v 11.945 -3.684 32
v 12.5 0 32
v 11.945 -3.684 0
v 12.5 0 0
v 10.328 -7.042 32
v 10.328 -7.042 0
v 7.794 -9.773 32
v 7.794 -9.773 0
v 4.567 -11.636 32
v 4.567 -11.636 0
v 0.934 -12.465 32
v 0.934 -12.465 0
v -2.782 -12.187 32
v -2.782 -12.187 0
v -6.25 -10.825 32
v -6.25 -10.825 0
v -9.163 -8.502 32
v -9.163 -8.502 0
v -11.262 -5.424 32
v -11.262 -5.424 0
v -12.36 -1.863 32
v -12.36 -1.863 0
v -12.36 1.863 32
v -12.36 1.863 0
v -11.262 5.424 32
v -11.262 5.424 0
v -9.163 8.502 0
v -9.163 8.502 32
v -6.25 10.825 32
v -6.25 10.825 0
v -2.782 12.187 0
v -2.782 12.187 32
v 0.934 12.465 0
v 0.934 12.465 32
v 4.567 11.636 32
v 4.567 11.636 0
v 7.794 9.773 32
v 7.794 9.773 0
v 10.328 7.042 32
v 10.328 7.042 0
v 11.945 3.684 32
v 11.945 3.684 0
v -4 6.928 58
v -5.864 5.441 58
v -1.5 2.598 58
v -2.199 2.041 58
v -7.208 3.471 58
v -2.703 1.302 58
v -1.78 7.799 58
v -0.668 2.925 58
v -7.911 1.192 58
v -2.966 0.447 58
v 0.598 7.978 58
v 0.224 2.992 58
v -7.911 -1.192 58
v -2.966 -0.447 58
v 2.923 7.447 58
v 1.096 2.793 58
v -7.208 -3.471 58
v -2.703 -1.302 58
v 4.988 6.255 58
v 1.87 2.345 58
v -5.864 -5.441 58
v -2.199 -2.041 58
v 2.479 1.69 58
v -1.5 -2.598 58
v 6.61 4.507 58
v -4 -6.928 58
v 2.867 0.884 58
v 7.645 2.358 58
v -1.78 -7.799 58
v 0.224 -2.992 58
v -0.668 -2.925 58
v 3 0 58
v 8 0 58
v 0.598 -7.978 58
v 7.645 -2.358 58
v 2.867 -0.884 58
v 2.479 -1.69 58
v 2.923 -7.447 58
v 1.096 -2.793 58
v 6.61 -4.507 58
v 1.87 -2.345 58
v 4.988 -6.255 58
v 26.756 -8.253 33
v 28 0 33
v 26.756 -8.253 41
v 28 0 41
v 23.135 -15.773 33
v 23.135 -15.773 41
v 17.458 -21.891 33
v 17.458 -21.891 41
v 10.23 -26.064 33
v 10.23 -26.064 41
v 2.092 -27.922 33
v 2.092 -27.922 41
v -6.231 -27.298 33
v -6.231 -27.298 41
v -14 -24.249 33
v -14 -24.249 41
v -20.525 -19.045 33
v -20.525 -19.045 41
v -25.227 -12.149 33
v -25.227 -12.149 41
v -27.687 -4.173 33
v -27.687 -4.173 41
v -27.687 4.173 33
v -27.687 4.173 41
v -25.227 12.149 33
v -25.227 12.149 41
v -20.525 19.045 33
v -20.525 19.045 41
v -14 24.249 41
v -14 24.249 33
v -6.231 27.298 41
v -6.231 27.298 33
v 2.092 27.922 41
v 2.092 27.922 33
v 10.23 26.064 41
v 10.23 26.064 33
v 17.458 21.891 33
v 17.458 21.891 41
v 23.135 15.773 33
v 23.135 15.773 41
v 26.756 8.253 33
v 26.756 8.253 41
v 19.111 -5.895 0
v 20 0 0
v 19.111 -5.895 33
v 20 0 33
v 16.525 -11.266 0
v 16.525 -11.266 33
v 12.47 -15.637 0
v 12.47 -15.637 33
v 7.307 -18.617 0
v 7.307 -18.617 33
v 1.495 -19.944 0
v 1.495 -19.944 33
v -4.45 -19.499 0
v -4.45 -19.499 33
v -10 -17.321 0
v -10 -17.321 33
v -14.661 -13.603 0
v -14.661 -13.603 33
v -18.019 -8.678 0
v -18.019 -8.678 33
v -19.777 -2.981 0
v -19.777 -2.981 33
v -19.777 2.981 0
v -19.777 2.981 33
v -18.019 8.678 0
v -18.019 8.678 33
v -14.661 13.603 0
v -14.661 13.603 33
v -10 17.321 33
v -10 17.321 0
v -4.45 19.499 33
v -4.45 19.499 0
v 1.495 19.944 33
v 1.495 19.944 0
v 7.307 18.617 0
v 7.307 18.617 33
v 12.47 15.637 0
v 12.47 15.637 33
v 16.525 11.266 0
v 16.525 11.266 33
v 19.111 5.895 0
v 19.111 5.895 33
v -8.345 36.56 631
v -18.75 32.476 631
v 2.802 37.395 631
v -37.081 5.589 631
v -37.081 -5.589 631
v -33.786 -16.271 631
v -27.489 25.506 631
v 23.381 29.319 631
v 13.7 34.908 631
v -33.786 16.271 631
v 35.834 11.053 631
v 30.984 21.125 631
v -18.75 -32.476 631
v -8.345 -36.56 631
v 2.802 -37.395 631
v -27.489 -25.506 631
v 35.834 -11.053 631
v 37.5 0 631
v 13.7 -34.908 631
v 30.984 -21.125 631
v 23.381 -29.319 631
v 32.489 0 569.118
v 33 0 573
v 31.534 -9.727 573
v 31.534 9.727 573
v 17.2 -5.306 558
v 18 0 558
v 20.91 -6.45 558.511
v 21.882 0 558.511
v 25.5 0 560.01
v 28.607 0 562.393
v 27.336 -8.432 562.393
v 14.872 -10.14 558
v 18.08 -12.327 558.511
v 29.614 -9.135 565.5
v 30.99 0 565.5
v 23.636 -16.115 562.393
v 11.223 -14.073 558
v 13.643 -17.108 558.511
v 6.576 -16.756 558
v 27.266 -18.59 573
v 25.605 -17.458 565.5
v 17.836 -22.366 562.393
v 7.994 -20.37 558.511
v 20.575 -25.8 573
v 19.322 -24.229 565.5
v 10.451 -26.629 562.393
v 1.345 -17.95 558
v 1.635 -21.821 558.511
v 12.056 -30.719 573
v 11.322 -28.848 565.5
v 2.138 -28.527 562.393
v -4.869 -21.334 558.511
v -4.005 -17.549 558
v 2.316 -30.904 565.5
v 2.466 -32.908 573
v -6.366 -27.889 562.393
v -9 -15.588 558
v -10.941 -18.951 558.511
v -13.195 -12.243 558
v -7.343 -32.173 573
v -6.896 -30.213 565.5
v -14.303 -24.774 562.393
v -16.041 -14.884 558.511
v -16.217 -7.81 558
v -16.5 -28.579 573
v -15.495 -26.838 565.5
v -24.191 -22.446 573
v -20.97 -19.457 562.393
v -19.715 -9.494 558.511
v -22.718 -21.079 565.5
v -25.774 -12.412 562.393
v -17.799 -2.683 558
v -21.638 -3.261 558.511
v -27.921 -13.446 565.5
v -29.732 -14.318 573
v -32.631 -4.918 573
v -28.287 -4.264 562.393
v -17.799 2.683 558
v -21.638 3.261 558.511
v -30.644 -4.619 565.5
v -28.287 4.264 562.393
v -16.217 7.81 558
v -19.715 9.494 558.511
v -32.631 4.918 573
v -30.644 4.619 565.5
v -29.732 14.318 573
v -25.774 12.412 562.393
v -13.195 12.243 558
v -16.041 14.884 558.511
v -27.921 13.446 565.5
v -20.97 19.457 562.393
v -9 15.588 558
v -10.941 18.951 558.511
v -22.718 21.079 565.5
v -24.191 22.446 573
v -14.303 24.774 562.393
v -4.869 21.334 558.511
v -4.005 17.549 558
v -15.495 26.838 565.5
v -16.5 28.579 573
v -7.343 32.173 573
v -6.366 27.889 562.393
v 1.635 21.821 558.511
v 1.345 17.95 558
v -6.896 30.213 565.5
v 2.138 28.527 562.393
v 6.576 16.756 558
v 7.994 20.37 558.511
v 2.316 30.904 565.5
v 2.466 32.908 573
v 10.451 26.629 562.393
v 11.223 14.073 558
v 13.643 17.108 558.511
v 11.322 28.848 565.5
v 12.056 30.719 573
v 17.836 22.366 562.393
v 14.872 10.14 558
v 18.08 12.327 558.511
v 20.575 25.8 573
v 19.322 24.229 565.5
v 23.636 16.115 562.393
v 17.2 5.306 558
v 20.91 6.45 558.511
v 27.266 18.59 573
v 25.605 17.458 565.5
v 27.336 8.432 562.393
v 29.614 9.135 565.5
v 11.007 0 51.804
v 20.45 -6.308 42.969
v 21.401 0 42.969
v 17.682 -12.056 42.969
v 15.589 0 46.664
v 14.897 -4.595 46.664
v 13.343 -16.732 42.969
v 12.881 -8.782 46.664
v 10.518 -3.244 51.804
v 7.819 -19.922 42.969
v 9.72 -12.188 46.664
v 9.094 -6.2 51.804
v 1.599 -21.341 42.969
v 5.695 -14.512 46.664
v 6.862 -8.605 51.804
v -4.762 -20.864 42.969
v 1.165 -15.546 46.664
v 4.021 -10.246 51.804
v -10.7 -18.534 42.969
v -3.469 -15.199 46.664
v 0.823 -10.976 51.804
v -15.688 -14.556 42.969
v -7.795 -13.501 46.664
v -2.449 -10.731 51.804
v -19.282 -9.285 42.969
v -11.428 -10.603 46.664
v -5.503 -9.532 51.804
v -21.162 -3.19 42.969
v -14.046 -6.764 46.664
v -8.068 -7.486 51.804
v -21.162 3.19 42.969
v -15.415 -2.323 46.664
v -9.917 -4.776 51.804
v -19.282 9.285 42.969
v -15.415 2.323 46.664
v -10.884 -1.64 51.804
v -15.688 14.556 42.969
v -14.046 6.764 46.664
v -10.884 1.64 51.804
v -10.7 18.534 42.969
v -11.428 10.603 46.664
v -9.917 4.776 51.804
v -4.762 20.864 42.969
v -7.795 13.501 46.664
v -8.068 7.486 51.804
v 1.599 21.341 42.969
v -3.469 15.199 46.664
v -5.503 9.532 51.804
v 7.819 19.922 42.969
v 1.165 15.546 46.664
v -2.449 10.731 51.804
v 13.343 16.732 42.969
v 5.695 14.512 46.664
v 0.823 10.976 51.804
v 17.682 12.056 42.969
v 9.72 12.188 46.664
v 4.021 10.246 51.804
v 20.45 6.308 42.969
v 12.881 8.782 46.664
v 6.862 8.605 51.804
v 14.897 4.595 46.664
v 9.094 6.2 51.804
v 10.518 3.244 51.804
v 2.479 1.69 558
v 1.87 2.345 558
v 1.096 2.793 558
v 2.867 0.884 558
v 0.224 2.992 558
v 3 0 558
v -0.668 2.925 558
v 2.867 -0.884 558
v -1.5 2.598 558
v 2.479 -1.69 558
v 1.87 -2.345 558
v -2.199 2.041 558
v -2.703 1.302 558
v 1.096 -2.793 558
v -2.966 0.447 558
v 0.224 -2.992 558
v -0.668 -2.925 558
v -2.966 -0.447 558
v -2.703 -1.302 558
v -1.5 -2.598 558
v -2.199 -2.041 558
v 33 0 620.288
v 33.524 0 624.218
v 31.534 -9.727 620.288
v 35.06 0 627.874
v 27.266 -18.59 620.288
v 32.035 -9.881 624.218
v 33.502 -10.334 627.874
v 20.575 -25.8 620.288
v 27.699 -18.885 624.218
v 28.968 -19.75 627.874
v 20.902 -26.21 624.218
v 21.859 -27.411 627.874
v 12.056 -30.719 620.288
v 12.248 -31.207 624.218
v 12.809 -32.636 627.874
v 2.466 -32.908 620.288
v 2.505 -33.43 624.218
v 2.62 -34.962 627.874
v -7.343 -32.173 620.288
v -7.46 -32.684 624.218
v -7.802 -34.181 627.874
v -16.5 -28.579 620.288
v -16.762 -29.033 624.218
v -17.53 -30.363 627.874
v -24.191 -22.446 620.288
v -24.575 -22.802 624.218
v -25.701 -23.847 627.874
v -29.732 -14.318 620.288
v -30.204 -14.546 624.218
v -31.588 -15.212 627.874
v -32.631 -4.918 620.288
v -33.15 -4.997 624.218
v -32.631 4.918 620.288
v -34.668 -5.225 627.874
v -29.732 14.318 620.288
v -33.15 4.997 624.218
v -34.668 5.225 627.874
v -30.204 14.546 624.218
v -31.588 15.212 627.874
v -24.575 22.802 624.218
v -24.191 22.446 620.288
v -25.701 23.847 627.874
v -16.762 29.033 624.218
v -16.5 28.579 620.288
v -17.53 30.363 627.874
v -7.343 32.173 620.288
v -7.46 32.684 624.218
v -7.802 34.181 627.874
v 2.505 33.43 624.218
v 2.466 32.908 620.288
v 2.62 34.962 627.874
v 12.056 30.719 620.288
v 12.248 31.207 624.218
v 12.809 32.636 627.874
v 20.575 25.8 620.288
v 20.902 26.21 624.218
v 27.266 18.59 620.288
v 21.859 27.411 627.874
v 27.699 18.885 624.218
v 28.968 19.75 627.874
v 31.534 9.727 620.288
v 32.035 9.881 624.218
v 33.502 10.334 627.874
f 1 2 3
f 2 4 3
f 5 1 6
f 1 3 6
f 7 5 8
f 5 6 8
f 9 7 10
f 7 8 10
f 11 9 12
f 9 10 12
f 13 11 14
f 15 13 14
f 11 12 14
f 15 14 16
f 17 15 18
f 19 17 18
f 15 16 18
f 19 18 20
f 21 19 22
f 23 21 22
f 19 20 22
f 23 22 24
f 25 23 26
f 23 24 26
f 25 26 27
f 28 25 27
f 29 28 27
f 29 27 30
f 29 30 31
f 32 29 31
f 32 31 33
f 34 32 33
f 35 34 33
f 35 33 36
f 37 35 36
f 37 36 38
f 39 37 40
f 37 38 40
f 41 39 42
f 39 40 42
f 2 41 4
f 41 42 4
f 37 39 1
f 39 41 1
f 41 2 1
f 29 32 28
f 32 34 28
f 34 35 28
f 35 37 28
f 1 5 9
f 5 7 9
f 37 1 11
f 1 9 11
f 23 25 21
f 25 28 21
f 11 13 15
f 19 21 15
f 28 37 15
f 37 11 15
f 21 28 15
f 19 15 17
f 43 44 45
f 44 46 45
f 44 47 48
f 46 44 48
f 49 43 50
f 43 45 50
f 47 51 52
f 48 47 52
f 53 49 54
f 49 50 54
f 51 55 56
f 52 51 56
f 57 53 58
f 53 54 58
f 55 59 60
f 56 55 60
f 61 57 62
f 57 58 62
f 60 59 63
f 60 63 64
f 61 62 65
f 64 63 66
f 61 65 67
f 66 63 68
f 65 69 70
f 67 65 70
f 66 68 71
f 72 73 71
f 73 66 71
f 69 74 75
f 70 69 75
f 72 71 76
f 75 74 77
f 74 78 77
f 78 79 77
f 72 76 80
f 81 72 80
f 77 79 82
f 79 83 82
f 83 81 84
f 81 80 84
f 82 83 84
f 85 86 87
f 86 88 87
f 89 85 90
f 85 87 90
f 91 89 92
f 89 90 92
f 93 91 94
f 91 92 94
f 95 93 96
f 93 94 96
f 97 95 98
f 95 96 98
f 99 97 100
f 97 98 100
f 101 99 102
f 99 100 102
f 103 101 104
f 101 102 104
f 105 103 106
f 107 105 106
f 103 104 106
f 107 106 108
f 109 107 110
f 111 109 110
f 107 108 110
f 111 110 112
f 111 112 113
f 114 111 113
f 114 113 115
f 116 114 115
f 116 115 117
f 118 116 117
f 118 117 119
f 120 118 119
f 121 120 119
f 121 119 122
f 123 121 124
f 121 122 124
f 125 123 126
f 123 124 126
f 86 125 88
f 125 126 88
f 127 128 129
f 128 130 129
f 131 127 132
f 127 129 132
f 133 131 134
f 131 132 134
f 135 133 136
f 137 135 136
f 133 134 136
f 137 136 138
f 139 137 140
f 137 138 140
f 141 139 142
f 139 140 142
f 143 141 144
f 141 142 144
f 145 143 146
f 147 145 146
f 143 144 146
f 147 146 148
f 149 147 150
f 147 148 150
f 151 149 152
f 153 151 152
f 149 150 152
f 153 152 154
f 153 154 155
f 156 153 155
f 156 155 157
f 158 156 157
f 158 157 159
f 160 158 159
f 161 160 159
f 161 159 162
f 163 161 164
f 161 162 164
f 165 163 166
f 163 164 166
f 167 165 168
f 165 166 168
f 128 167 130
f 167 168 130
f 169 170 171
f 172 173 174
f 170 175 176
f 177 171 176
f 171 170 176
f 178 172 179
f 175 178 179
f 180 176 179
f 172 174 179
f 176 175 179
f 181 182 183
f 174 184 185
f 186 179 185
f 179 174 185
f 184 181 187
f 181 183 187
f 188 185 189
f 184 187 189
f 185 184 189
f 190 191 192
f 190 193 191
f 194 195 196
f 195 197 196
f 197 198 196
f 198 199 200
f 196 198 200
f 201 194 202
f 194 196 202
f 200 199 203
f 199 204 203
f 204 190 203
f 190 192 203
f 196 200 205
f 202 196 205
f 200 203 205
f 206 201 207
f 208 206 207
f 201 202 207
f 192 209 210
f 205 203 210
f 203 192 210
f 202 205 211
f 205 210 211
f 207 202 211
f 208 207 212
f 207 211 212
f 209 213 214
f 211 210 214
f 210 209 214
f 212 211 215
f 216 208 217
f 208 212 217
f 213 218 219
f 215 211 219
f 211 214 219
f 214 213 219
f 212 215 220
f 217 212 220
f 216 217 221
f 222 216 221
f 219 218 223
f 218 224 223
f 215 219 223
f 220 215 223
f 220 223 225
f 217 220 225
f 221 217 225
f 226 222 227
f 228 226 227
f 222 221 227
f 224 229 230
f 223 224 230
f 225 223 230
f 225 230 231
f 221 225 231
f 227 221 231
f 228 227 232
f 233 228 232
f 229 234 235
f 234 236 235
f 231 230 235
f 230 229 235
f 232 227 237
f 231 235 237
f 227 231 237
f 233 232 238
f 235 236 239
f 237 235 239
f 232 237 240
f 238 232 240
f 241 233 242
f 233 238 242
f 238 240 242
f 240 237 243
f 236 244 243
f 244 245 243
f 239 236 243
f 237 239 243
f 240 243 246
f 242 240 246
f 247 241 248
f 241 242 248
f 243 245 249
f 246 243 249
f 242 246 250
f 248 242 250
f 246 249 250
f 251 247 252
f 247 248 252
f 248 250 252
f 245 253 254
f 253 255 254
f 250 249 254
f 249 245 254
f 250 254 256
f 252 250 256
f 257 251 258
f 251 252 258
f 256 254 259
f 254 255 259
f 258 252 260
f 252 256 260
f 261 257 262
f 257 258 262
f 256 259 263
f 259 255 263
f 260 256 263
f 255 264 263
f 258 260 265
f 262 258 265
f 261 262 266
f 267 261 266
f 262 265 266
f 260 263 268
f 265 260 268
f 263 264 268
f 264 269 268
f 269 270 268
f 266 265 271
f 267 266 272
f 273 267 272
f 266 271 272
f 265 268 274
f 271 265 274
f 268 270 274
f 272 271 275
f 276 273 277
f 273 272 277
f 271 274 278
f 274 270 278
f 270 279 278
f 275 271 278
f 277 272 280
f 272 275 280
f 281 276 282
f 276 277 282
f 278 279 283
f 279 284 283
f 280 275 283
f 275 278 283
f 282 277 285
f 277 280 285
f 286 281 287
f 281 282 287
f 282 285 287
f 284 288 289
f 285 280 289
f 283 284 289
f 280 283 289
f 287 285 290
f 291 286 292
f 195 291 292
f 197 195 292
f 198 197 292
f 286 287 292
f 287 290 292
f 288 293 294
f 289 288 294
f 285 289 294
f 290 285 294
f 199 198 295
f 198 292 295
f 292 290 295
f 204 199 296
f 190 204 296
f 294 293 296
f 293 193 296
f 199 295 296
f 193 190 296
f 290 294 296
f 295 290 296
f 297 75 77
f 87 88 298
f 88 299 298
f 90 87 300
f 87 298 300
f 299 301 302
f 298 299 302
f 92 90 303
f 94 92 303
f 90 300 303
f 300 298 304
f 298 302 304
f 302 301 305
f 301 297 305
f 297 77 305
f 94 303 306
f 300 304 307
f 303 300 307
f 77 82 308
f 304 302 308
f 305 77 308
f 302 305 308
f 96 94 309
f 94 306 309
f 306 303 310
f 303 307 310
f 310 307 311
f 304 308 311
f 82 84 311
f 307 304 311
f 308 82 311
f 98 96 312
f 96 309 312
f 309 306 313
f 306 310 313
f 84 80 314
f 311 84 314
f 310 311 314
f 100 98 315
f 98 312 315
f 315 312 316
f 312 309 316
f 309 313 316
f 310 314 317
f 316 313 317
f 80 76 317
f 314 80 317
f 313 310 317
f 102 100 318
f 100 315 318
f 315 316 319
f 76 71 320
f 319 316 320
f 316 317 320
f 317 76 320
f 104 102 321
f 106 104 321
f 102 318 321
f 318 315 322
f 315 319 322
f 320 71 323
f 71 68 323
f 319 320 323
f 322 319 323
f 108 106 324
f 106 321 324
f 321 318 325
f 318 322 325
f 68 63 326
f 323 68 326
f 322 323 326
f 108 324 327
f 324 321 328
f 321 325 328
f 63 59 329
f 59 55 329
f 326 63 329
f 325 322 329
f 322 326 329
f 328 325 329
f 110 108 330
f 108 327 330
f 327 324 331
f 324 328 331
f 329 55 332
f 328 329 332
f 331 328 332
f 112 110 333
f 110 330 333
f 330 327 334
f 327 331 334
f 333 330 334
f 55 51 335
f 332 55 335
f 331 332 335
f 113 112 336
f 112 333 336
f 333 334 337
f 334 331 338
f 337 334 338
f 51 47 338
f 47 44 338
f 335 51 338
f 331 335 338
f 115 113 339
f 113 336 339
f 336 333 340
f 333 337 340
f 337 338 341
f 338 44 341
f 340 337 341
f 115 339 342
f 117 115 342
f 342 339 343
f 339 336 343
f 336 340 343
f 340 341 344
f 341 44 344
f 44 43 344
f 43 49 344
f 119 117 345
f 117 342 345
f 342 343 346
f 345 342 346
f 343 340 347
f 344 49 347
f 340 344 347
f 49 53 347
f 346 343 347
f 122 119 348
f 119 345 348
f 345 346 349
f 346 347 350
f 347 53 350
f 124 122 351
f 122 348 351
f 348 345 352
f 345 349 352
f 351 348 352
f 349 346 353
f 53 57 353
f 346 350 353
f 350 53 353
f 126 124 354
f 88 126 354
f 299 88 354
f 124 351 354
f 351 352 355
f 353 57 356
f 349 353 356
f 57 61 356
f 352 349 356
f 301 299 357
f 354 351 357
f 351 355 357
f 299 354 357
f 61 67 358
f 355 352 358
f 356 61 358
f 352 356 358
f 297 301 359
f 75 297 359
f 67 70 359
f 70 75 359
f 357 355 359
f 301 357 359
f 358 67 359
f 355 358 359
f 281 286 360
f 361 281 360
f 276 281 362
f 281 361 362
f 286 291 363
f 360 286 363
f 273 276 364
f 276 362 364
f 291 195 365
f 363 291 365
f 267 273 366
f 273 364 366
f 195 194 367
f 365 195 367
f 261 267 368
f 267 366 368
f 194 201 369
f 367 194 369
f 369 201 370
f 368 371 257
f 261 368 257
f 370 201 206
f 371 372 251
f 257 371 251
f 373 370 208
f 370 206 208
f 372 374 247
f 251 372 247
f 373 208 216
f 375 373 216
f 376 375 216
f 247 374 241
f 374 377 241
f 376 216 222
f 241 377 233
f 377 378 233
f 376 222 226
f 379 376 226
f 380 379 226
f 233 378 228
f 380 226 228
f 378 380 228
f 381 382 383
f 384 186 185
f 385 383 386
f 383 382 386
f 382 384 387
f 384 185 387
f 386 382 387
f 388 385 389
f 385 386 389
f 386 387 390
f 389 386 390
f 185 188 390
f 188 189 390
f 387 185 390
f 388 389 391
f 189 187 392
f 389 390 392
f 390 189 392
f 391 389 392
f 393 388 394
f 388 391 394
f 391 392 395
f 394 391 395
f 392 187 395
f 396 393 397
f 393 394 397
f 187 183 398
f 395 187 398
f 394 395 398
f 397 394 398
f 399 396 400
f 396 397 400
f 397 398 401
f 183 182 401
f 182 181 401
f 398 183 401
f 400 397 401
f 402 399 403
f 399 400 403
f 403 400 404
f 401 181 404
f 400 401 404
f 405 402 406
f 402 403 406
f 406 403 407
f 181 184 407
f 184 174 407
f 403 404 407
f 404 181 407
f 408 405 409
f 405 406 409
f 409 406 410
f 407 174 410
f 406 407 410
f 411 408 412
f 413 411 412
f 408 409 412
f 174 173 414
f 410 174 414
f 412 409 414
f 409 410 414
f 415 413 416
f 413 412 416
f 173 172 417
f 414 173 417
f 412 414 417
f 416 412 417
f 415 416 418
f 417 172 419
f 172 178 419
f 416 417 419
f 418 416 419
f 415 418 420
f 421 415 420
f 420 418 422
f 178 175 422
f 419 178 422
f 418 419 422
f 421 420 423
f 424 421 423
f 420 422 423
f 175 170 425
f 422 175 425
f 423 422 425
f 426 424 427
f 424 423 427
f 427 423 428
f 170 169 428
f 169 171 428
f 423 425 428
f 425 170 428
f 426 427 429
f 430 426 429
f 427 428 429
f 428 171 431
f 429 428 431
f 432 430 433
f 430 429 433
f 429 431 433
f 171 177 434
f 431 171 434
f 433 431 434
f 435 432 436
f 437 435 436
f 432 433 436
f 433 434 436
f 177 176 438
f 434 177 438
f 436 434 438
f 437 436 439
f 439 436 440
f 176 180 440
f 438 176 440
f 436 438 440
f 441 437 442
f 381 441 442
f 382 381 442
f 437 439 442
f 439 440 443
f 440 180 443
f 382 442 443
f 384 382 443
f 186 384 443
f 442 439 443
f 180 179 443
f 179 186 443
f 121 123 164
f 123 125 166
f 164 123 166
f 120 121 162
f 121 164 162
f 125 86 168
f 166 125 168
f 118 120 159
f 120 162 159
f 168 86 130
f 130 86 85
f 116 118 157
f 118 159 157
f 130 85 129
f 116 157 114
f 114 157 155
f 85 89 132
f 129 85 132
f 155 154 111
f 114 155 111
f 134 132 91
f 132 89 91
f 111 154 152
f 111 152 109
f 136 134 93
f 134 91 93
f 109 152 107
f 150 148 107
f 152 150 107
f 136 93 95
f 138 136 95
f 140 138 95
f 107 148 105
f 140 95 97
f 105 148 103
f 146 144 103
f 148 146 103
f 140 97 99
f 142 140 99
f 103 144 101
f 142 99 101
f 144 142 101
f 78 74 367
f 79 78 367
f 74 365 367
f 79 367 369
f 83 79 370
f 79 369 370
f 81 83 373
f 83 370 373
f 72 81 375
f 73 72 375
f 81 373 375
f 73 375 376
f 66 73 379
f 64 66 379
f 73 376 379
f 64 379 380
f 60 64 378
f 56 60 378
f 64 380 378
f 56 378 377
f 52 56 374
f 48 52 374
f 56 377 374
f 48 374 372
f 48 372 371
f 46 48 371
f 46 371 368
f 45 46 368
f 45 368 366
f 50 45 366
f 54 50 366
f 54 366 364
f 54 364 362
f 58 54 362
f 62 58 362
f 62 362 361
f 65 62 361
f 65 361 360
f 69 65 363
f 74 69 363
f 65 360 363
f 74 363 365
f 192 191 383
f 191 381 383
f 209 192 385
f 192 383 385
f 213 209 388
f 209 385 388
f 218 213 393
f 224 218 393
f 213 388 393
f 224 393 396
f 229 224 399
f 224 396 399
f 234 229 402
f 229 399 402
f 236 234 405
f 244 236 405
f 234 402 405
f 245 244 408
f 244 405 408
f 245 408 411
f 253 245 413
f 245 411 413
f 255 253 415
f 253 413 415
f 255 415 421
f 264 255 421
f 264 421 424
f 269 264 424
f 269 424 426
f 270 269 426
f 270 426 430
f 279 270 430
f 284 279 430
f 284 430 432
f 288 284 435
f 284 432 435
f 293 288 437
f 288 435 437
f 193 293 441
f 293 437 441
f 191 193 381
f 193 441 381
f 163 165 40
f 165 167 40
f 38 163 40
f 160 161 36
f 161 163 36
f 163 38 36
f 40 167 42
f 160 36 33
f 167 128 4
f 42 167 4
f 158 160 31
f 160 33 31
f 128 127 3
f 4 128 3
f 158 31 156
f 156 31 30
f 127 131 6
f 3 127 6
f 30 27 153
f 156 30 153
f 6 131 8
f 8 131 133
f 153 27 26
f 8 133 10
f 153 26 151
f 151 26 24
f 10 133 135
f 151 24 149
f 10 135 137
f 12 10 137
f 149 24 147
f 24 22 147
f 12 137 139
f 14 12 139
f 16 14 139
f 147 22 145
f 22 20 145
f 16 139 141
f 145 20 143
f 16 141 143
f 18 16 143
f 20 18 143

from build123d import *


with BuildPart() as f1:
    # F0 (on Front) → F1 (revolve)
    with BuildSketch(Plane.XZ):
        with BuildLine():
            Line((0, 631), (0, 32))
            Line((0, 32), (12.5, 32))
            Line((12.5, 32), (12.5, 0))
            Line((12.5, 0), (20, 0))
            Line((20, 0), (20, 33))
            Line((20, 33), (28, 33))
            Line((28, 33), (28, 41))
            ThreePointArc((28, 41), (15.589403, 46.664003), (8, 58))
            Line((8, 58), (3, 58))
            Line((3, 58), (3, 558))
            Line((3, 558), (18, 558))
            ThreePointArc((18, 558), (28.606602, 562.393398), (33, 573))
            Line((33, 573), (33, 620.287857))
            ThreePointArc((33, 620.287857), (34.170683, 626.097332), (37.5, 631))
            Line((37.5, 631), (0, 631))
        make_face()
    revolve(axis=Axis((0, 0, 331.5), (0, 0, -1)))


solid = f1.part
